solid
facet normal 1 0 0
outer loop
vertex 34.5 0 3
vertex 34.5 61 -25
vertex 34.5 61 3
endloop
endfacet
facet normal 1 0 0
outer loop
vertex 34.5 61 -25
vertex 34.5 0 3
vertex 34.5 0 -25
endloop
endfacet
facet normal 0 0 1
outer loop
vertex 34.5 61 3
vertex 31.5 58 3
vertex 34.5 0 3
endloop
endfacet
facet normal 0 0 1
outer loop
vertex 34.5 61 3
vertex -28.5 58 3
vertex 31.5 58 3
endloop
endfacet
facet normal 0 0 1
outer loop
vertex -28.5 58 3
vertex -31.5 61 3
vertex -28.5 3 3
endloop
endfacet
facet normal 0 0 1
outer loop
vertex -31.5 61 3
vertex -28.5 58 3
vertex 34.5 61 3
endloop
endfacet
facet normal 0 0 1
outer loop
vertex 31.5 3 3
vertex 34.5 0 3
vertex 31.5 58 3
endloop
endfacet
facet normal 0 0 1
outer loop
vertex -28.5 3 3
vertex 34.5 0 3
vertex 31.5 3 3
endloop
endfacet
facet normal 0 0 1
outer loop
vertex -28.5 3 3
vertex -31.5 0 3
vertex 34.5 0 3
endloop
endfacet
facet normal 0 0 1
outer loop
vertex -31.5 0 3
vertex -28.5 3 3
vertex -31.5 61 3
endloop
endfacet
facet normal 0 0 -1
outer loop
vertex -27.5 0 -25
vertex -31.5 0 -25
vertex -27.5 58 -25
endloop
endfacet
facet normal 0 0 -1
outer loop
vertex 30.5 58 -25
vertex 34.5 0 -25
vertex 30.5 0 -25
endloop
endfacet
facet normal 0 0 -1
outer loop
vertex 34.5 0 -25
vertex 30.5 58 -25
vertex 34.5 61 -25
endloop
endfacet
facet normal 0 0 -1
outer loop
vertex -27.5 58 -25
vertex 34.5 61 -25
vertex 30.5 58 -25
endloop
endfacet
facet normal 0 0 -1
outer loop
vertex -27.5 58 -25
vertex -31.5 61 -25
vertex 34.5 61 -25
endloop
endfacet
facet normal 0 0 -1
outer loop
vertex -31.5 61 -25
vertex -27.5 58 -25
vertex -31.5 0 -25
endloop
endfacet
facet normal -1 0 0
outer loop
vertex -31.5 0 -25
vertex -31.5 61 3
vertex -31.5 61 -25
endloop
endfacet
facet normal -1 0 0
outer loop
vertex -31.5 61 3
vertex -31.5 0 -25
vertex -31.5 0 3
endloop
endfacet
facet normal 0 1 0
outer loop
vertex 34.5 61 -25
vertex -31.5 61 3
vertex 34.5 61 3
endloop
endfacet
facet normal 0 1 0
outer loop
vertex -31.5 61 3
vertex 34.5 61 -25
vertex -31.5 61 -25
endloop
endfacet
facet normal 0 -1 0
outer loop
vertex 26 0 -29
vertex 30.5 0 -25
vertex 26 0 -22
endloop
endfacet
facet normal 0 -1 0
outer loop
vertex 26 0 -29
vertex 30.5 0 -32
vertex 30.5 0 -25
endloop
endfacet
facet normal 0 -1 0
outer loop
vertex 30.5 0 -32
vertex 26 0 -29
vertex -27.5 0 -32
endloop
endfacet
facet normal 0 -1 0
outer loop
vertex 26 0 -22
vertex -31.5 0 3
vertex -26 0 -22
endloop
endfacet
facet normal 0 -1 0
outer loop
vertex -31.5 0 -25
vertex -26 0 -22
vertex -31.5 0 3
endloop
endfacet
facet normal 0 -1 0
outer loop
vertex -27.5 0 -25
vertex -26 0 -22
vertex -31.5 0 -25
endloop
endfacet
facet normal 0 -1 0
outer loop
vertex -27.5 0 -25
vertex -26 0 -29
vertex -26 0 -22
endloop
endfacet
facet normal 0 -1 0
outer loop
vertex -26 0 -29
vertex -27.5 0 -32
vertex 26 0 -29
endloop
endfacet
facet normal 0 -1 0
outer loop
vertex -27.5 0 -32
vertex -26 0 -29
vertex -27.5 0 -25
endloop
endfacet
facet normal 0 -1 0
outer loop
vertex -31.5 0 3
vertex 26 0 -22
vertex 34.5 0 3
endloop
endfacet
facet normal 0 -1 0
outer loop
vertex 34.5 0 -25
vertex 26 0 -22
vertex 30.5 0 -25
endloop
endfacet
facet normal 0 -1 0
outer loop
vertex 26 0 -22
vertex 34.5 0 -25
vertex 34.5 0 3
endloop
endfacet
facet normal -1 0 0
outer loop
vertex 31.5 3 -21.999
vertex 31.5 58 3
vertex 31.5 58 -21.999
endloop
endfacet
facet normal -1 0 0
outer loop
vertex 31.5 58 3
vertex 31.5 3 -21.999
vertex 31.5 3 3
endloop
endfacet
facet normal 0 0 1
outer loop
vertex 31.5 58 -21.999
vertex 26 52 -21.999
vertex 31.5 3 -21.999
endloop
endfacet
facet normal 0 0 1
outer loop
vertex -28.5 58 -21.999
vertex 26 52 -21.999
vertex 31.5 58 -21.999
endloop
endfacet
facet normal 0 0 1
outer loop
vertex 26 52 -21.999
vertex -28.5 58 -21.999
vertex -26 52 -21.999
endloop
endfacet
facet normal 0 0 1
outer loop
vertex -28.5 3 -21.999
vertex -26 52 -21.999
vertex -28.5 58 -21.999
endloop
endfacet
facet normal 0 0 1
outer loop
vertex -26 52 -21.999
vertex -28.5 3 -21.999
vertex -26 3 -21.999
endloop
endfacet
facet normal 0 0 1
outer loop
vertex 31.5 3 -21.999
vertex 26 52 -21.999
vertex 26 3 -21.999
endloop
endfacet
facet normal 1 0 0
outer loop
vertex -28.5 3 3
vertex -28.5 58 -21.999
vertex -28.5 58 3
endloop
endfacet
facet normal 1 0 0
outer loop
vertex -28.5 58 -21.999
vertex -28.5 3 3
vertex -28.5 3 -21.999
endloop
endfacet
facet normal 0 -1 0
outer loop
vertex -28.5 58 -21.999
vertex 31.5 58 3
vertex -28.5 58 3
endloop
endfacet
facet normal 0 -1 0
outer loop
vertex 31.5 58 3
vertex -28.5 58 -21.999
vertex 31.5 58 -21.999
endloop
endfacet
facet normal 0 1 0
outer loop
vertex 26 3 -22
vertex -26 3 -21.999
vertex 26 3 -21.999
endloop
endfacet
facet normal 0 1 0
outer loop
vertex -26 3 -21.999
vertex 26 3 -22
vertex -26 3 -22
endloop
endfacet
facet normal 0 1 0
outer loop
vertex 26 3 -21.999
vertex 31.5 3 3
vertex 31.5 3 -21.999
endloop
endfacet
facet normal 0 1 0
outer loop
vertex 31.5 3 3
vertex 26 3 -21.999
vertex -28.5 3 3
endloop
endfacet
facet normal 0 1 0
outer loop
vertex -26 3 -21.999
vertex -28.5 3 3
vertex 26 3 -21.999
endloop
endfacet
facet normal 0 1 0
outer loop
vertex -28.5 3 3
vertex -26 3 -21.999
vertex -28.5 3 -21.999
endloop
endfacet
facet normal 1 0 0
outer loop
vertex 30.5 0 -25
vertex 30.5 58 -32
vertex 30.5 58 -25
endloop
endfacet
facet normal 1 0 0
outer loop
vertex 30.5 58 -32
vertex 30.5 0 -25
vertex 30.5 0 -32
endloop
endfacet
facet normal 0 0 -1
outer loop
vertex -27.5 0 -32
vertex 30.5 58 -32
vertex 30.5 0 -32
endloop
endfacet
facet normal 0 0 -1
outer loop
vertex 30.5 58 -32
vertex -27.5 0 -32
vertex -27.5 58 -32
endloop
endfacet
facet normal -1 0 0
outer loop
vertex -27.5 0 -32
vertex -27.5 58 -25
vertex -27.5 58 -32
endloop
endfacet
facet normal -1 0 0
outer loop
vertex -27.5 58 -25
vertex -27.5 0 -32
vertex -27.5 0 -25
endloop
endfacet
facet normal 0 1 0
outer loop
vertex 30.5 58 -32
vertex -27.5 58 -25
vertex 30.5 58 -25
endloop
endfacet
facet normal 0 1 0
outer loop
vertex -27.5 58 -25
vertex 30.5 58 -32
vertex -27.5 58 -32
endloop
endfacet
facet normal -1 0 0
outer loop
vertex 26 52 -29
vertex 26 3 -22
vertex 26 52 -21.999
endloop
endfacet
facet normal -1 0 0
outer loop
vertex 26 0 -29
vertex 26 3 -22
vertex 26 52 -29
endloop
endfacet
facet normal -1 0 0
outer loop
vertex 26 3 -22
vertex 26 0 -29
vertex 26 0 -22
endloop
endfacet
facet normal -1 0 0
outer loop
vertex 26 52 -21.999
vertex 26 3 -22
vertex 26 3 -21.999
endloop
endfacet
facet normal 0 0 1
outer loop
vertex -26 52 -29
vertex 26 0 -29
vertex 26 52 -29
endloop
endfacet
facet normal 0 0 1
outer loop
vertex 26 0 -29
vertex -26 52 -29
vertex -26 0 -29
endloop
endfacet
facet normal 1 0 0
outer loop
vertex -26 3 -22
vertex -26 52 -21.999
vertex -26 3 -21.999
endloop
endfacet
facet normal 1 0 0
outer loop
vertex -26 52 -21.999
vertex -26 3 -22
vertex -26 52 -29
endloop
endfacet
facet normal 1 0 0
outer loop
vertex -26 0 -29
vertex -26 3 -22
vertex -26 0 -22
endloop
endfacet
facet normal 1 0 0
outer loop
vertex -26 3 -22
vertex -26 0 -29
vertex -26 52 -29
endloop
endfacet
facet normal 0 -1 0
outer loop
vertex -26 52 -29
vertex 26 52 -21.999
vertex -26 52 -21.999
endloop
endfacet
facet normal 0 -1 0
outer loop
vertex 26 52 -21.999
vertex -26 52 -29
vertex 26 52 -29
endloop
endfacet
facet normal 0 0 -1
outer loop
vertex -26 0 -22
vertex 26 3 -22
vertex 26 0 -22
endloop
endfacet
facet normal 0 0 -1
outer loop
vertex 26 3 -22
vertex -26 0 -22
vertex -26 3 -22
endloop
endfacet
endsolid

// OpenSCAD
// file: extender_base.scad
/*battery=[60,55,25];

wall_thickness=3;

module __Customizer_Limit__ () {}*/

board=[52,52,7];

translate([0,0,-(board.z+battery.z)]) union() {
difference() {
union() {
	translate([-board.x/2 -wall_thickness/2, 0,0]) cube([board.x+wall_thickness*2,board.y+wall_thickness*2,board.z+wall_thickness]);

	translate([-battery.x/2 -wall_thickness/2, 0,board.z]) 
		difference() {
			cube([battery.x+wall_thickness*2,battery.y+wall_thickness*2,battery.z+wall_thickness]);
			translate([wall_thickness,wall_thickness,wall_thickness+0.001]) cube(battery);
	}
}
union() {
	translate([-board.x/2, wall_thickness, wall_thickness]) cube([board.x,board.y-wall_thickness,board.z+wall_thickness*2]);
	translate([-board.x/2, 0, wall_thickness]) cube([board.x,wall_thickness, board.z]);
}
}


//connector fill here 
}
// main file
phone=[80,165,10];

phone_corner_radius=15;

//distance from bottom to naerest of naerest button on the right
button_cutout_right_start=12;
//distance from bottom to farthest edge of farthest button on the right
button_cutout_right_stop=15;
//distance from bottom to farthest edge of farthest button on the left
button_cutout_left_start=0;
//distance from bottom to farthest edge of farthest button on the left
button_cutout_left_stop=0;

battery=[60,55,25];

wall_thickness=3;

module __Customizer_Limit__ () {}

include <extender_base.scad>


//phe case stoff here
